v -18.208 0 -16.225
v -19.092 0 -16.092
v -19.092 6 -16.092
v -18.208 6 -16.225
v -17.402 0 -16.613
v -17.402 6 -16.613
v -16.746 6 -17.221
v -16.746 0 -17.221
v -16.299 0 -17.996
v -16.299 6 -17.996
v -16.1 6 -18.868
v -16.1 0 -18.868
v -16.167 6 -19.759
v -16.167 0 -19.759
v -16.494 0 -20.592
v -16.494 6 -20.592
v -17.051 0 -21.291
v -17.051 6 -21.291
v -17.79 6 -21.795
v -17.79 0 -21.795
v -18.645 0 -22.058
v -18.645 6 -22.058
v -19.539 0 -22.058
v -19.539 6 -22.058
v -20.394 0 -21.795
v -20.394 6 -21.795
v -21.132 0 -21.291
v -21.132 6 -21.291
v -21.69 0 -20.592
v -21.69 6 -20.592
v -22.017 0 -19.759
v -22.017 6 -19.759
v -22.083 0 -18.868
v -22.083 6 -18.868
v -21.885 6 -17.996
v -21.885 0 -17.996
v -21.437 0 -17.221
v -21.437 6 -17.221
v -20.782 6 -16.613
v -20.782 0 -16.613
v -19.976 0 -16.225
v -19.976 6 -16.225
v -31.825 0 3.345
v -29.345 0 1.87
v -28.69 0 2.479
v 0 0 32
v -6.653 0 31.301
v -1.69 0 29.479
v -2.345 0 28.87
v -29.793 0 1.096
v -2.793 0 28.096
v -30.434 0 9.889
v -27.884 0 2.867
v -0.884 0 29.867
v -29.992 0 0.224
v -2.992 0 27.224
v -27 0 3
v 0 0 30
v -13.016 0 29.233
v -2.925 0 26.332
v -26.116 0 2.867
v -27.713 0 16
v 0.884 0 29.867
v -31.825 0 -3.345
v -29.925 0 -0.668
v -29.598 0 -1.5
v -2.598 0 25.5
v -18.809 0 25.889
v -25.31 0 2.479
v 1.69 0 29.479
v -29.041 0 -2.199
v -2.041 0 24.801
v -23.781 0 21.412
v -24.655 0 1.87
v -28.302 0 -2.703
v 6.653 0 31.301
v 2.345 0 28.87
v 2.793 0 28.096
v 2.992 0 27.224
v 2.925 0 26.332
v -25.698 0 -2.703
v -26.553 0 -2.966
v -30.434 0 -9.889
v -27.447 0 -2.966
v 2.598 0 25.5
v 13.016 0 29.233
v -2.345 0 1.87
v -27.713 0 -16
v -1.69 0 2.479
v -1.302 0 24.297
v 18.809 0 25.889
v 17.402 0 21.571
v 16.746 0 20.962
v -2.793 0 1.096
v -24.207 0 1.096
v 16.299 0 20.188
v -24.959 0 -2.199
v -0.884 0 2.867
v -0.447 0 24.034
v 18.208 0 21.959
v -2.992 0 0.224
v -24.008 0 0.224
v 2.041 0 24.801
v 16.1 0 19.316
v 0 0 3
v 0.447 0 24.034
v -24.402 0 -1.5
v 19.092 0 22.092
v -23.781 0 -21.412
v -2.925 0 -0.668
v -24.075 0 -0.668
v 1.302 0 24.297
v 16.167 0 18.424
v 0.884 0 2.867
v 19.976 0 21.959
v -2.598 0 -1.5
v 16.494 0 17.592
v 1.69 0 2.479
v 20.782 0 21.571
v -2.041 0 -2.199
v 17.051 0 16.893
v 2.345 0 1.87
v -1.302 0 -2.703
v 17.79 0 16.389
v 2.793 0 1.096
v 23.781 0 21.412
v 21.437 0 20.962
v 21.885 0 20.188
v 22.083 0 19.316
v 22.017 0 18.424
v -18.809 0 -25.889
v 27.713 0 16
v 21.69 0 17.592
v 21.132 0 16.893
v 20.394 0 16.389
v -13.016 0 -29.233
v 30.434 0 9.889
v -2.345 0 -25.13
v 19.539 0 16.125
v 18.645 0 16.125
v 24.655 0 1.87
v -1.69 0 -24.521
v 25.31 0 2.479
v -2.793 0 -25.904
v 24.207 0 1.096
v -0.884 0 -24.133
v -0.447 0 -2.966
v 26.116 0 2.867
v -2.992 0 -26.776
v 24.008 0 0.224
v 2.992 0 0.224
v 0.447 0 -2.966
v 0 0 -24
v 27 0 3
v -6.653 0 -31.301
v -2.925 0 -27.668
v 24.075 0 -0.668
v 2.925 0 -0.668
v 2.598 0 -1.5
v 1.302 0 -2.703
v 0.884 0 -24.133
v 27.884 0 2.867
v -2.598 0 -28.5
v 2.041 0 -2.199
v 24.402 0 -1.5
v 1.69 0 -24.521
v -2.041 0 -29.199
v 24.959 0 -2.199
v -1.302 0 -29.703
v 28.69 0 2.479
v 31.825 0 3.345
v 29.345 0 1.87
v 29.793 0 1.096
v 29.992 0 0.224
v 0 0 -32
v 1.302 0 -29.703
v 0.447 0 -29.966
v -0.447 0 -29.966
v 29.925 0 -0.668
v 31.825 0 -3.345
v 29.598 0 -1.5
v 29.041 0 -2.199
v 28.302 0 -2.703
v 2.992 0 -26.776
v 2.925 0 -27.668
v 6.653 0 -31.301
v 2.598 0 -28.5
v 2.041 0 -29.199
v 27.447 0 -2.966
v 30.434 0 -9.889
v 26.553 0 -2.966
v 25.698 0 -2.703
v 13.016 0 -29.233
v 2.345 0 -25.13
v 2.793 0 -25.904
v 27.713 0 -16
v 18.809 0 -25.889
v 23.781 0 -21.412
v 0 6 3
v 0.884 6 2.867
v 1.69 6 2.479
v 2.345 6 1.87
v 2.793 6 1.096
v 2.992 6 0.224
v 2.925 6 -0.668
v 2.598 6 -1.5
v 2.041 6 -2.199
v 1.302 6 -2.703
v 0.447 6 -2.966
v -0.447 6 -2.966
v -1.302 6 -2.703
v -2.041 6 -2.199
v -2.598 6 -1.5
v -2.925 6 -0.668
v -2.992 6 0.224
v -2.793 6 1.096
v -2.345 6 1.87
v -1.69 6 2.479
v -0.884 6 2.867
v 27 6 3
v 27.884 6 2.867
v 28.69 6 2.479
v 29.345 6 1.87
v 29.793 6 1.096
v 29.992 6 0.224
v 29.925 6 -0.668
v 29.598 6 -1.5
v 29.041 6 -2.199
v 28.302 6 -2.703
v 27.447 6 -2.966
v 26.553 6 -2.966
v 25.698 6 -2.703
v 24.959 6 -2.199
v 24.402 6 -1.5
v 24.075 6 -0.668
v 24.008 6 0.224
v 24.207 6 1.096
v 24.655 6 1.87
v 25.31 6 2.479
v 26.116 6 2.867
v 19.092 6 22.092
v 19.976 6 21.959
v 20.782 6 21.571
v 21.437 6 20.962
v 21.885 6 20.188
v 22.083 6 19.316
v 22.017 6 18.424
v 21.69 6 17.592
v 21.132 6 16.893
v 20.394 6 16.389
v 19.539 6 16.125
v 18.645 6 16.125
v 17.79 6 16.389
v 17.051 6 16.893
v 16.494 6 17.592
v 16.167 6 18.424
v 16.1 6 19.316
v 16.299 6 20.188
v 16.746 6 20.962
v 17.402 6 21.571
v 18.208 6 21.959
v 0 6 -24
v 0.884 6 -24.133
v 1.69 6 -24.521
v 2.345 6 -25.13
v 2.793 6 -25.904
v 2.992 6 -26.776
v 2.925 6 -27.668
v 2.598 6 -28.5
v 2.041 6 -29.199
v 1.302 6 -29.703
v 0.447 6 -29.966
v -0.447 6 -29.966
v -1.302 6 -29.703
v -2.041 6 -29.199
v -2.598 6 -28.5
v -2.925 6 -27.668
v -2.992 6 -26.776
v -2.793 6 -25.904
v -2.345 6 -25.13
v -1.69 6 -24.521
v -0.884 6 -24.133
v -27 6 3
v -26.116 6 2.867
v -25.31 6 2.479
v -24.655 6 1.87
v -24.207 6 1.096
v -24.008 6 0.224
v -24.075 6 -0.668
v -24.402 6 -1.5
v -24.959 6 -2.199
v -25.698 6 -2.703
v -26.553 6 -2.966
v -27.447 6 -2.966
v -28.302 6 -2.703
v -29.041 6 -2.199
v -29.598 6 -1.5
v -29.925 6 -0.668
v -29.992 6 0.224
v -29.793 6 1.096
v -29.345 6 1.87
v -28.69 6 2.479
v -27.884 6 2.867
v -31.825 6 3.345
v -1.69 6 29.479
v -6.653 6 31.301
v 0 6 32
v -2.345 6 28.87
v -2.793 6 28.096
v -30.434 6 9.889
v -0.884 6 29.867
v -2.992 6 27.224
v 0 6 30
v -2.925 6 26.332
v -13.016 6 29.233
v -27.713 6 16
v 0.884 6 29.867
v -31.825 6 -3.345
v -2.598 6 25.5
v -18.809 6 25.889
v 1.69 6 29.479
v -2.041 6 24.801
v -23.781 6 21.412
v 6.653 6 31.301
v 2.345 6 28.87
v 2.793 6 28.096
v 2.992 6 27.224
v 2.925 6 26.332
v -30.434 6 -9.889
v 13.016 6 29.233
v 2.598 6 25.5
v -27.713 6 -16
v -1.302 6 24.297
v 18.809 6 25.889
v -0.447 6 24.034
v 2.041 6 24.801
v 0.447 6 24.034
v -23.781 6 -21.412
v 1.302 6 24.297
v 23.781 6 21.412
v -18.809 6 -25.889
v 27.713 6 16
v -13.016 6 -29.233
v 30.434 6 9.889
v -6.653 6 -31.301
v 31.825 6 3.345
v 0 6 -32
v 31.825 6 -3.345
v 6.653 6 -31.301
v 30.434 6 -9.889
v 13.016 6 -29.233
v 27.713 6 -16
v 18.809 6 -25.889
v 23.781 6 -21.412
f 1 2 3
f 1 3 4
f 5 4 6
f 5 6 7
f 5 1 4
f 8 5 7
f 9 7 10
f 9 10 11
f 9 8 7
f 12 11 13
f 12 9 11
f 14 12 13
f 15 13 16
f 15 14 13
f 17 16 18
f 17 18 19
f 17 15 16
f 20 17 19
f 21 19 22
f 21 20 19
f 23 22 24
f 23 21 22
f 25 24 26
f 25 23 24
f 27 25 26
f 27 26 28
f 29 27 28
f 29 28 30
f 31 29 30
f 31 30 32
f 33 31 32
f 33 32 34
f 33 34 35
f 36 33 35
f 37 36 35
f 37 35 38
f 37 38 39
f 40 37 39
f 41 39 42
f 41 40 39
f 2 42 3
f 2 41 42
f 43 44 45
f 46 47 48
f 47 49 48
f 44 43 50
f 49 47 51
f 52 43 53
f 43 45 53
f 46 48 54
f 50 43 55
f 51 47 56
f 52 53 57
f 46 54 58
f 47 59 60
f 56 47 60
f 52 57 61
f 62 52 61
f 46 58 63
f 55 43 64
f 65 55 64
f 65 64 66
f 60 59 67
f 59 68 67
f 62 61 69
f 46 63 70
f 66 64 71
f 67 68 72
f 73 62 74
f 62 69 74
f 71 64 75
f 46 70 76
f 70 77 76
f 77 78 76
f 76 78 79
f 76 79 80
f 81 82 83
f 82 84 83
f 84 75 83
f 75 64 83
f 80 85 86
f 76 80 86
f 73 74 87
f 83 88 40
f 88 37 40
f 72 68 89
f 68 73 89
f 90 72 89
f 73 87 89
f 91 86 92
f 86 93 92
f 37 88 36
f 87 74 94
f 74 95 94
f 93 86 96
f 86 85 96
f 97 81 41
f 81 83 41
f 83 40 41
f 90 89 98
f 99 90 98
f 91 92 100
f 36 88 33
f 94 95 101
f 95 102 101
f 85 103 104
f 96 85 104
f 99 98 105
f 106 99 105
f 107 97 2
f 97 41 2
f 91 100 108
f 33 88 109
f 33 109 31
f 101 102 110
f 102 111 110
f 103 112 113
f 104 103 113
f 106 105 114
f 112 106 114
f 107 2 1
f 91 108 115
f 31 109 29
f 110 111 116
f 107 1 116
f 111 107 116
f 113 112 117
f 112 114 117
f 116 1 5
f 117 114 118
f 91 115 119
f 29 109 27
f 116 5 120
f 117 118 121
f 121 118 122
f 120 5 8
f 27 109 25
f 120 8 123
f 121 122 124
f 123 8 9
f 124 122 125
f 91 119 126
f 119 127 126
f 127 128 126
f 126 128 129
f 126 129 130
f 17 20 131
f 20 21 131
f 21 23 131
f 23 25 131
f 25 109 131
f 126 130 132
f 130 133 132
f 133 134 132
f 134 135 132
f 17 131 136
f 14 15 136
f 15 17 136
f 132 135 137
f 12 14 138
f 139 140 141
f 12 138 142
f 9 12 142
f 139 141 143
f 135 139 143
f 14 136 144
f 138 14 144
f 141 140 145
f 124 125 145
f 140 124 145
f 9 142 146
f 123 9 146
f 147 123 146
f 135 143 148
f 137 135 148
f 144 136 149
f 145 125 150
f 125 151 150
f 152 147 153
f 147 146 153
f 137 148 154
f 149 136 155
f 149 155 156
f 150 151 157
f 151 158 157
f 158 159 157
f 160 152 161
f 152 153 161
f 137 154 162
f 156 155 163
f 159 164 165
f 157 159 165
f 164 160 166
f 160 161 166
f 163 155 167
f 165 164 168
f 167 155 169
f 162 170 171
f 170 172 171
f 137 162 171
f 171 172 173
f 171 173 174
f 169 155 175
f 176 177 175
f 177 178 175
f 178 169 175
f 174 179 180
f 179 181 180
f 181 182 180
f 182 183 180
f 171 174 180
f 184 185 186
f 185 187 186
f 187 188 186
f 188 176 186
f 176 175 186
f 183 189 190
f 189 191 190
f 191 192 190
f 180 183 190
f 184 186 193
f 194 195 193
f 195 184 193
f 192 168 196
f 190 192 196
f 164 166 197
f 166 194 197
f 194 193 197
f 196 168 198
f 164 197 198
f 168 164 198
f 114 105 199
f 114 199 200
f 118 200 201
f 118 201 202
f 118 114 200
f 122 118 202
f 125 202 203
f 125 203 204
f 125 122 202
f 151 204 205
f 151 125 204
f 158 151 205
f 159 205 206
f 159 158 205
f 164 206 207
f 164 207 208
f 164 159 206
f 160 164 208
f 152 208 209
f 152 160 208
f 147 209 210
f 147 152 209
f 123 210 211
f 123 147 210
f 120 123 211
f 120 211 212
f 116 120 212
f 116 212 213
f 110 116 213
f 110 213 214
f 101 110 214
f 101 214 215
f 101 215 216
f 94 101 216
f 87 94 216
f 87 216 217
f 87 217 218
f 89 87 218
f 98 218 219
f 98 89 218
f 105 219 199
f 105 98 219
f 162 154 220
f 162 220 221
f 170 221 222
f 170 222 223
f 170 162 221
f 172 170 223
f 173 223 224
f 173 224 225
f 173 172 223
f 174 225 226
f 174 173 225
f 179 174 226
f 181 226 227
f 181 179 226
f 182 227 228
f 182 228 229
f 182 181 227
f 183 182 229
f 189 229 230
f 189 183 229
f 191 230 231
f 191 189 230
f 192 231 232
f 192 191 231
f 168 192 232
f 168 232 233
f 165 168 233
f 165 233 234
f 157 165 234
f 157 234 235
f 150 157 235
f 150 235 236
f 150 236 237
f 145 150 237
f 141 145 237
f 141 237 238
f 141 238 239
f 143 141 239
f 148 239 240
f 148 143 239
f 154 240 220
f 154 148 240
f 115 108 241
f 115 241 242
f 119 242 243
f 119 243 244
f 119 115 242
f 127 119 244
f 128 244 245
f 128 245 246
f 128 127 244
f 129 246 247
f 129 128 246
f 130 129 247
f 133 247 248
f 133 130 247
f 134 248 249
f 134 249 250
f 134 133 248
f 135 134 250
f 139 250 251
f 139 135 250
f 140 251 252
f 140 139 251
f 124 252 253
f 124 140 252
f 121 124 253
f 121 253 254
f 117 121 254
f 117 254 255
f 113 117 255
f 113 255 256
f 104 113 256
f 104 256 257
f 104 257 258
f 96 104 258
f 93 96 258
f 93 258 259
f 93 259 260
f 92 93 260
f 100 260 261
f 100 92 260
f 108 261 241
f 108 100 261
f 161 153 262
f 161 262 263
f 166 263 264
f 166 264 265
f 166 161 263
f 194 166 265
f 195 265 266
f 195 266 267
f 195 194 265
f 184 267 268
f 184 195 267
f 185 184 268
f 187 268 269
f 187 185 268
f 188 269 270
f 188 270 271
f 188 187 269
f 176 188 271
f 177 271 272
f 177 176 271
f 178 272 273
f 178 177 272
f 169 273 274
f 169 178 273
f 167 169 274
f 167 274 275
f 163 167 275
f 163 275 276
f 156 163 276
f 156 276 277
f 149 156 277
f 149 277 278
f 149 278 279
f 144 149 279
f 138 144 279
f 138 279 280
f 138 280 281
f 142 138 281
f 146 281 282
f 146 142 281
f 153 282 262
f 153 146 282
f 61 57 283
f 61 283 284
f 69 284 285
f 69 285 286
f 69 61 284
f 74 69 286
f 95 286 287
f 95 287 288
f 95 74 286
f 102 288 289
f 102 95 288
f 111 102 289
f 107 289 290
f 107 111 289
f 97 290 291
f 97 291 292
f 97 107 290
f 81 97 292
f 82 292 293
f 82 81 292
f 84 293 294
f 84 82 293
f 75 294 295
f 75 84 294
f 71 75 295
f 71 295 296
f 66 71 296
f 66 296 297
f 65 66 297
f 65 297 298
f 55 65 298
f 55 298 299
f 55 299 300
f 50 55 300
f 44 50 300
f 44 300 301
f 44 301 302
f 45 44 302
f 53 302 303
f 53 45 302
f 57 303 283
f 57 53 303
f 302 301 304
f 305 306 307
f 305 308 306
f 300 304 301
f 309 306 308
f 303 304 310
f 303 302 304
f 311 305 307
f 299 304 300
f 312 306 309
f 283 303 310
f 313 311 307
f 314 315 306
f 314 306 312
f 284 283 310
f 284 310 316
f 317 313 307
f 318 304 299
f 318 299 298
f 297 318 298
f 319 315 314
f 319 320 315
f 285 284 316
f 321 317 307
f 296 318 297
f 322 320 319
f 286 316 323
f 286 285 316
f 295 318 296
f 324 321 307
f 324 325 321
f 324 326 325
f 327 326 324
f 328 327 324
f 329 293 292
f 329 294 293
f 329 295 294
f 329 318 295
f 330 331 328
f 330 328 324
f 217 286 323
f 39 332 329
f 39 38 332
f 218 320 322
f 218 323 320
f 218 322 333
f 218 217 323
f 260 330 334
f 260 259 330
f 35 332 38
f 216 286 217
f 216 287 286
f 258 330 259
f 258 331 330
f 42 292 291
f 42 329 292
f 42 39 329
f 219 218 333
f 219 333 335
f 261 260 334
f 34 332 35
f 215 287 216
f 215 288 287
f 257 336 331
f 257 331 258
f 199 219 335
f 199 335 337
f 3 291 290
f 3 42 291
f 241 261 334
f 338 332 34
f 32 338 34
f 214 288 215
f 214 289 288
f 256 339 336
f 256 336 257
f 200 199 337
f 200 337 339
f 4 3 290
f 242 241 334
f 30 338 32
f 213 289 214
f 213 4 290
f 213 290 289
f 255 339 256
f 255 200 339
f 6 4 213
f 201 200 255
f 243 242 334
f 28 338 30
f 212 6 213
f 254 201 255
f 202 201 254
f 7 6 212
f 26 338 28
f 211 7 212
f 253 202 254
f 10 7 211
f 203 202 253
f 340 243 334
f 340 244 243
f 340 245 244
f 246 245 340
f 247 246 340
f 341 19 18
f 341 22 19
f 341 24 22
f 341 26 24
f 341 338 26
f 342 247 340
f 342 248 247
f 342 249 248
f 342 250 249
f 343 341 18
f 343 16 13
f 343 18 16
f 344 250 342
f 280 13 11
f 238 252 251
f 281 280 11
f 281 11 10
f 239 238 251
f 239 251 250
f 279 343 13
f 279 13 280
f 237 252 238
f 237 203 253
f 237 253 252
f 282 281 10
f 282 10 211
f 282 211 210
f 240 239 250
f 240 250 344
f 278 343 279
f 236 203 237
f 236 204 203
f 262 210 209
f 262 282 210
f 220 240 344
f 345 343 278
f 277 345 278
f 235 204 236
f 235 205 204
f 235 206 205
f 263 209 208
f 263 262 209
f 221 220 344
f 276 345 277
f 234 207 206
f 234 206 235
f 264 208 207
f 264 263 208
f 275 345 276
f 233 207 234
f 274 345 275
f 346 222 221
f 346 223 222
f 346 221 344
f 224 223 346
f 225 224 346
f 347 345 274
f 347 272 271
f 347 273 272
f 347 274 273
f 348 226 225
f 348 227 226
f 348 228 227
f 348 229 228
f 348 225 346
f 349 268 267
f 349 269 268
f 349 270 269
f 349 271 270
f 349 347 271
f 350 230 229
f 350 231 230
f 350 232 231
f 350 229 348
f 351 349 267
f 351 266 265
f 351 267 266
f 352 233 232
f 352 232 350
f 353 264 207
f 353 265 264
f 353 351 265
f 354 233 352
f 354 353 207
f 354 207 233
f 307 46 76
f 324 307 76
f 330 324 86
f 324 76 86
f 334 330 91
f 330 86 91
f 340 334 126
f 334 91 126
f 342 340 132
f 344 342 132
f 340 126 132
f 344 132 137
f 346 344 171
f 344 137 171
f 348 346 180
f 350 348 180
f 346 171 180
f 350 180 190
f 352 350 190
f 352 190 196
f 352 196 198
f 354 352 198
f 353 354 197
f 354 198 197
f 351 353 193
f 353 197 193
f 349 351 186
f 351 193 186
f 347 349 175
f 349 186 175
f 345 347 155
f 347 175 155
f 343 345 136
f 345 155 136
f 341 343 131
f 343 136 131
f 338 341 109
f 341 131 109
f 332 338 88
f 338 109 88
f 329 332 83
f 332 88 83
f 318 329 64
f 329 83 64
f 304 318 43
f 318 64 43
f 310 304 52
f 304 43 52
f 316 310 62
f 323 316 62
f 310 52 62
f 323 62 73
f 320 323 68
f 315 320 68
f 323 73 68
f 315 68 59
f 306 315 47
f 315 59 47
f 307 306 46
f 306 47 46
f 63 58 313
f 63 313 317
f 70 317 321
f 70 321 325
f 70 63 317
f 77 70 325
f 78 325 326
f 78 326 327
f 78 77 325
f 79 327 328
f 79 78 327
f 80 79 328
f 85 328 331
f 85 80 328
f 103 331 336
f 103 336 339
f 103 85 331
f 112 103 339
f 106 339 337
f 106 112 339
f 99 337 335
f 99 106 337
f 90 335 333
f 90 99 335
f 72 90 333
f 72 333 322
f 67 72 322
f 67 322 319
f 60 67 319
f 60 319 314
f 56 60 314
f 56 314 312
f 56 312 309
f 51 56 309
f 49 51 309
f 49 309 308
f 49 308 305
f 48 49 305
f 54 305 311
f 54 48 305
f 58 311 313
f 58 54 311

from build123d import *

# Parameters (mm, degrees)
ESBO_O1_R                = 32
ESBO_O1_R_2              = 5
ESBO_O1_R_3              = 3
RESSALTO_EXTRUS_O1_DEPTH = 6
RESSALTO_EXTRUS_O3_START = -6
ESBO_O2_R                = 5
ESBO_O2_R_2              = 3
RESSALTO_EXTRUS_O3_DEPTH = 6


with BuildPart() as part:
    # Esboço1 → Ressalto-extrusão1 (new body)
    with BuildSketch(Plane(origin=(0, 0, 0), x_dir=(1, 0, 0), z_dir=(0, 1, 0))):
        with Locations(Location((0, 0, 0), (0, 0, 270))):
            Circle(ESBO_O1_R)
        with Locations(Location((0, 0, 0), (0, 0, 270))):
            Circle(ESBO_O1_R_2, mode=Mode.SUBTRACT)
        with Locations(Location((0, 27, 0), (0, 0, 270))):
            Circle(ESBO_O1_R_3, mode=Mode.SUBTRACT)
        with Locations(Location((27, 0, 0), (0, 0, 270))):
            Circle(ESBO_O1_R_3, mode=Mode.SUBTRACT)
        with Locations(Location((0, -27, 0), (0, 0, 270))):
            Circle(ESBO_O1_R_3, mode=Mode.SUBTRACT)
        with Locations(Location((-27, 0, 0), (0, 0, 270))):
            Circle(ESBO_O1_R_3, mode=Mode.SUBTRACT)
        with Locations(Location((-19.091883092, 19.091883092, 0), (0, 0, 270))):
            Circle(ESBO_O1_R_3, mode=Mode.SUBTRACT)
        with Locations(Location((19.091883092, -19.091883092, 0), (0, 0, 270))):
            Circle(ESBO_O1_R_3, mode=Mode.SUBTRACT)
    extrude(amount=RESSALTO_EXTRUS_O1_DEPTH)

    # Esboço2 → Ressalto-extrusão3 (add)
    with BuildSketch(Plane(origin=(0, 6, 0), x_dir=(1, 0, 0), z_dir=(0, 1, 0)).offset(RESSALTO_EXTRUS_O3_START)):
        Circle(ESBO_O2_R)
        with Locations(Location((0, 0, 0), (0, 0, 270))):
            Circle(ESBO_O2_R_2, mode=Mode.SUBTRACT)
    extrude(amount=RESSALTO_EXTRUS_O3_DEPTH)


solid = part.part
